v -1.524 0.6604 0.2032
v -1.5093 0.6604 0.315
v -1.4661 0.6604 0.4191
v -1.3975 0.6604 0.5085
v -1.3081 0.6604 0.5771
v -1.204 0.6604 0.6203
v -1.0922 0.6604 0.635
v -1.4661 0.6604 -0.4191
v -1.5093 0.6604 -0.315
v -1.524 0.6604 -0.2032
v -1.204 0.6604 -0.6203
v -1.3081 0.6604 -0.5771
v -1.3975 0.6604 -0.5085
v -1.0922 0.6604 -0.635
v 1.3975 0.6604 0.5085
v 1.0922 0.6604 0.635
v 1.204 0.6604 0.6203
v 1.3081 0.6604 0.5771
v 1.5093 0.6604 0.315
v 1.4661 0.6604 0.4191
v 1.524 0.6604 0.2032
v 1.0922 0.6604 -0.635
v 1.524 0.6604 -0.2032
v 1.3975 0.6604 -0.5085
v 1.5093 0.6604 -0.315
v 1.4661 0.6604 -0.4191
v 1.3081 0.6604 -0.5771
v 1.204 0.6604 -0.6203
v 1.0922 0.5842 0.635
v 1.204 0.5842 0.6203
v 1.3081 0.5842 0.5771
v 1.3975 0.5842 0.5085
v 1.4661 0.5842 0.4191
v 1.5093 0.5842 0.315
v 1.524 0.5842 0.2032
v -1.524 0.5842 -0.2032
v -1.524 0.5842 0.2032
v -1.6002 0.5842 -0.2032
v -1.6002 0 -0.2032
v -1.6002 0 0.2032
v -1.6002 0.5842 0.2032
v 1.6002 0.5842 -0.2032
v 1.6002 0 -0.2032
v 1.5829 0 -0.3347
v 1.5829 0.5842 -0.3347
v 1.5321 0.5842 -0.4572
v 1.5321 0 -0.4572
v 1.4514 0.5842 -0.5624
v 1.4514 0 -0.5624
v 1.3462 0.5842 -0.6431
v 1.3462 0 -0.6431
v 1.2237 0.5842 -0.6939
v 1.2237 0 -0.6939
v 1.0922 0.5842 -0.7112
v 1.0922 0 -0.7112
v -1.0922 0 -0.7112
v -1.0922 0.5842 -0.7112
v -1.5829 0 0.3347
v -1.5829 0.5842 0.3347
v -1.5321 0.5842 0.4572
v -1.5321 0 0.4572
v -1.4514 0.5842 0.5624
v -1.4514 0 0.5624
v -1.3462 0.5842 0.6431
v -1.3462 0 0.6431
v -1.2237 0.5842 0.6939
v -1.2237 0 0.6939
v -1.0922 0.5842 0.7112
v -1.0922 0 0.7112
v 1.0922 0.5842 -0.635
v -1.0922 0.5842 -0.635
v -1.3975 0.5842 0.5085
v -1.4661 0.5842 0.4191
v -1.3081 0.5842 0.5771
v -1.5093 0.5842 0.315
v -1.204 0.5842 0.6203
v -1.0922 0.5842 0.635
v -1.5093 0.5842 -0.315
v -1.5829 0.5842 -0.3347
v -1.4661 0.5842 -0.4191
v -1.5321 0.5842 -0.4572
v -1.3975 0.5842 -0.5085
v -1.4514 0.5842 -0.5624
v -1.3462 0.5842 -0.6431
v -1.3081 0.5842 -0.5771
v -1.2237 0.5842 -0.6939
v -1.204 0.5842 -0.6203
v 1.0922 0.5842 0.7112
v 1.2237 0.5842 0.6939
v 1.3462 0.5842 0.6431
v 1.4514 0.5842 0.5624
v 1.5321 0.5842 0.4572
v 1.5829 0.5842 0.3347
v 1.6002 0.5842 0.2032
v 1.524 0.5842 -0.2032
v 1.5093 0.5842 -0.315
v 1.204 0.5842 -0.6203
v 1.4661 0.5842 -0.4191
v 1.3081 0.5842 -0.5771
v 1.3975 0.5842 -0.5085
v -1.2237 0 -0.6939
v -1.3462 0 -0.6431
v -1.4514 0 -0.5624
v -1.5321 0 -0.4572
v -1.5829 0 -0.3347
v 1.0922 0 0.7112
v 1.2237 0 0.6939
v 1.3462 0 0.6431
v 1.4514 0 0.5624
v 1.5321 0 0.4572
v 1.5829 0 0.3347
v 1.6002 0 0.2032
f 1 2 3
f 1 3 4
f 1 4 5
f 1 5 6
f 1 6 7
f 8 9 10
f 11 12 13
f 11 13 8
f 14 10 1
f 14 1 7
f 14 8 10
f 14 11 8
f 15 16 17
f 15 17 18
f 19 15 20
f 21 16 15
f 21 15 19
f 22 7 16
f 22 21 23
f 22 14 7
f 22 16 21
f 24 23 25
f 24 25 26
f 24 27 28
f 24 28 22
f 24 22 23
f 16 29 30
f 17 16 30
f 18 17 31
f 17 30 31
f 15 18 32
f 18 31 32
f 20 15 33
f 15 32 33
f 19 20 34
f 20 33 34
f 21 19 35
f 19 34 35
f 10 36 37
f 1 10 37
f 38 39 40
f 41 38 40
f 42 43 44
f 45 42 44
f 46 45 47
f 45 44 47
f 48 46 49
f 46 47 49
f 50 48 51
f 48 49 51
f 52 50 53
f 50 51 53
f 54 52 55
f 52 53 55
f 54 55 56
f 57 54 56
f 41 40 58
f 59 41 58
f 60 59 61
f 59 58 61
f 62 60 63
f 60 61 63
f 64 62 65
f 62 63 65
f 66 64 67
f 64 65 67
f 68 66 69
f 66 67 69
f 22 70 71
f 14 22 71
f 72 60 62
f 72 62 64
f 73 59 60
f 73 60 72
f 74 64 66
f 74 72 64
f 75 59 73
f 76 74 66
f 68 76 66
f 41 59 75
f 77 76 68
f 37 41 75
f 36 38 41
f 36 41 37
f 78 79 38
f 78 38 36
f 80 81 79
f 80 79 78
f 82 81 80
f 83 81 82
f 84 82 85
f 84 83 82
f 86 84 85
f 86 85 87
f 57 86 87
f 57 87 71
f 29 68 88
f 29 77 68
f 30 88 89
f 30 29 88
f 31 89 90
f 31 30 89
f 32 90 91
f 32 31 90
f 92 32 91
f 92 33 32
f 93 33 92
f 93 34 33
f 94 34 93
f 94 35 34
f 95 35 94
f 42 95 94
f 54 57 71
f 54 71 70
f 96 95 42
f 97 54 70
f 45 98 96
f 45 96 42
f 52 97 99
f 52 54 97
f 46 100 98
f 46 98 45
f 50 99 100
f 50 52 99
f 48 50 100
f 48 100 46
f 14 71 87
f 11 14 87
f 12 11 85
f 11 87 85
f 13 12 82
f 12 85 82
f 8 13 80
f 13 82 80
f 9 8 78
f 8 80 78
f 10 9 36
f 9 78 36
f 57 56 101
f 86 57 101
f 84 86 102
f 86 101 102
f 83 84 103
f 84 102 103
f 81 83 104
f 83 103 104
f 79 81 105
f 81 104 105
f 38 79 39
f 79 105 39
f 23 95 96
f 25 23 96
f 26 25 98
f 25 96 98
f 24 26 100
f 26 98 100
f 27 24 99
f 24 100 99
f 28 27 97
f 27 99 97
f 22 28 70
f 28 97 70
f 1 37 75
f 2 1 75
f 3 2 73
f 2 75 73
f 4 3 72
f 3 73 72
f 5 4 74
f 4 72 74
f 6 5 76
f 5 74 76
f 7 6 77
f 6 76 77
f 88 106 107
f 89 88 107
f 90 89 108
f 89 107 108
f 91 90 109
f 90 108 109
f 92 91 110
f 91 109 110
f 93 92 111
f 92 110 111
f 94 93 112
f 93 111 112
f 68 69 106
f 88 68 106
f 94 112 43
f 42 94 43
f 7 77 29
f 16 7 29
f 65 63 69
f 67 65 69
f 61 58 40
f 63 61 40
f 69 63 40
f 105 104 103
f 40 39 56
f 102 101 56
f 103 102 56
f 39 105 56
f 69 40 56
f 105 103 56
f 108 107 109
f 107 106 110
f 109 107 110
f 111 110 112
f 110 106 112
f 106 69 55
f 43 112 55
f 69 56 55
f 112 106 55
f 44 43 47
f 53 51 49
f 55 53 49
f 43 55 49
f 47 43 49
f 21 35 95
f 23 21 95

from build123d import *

# Parameters (mm, degrees)
BOSS_EXTRUDE1_DEPTH = 0.5842
BOSS_EXTRUDE2_DEPTH = 0.0762


with BuildPart() as part:
    # Sketch1 → Boss-Extrude1 (new body)
    with BuildSketch(Plane(origin=(0, 0, 0), x_dir=(1, 0, 0), z_dir=(0, 1, 0))):
        with BuildLine():
            Line((-1.6002, 0.2032), (-1.6002, -0.2032))
            ThreePointArc((-1.6002, -0.2032), (-1.451410245, -0.562410245), (-1.0922, -0.7112))
            Line((-1.0922, -0.7112), (1.0922, -0.7112))
            ThreePointArc((1.0922, -0.7112), (1.451410245, -0.562410245), (1.6002, -0.2032))
            Line((1.6002, -0.2032), (1.6002, 0.2032))
            ThreePointArc((1.6002, 0.2032), (1.451410245, 0.562410245), (1.0922, 0.7112))
            Line((1.0922, 0.7112), (-1.0922, 0.7112))
            ThreePointArc((-1.0922, 0.7112), (-1.451410245, 0.562410245), (-1.6002, 0.2032))
        make_face()
    extrude(amount=BOSS_EXTRUDE1_DEPTH)

    # Sketch2 → Boss-Extrude2 (add)
    with BuildSketch(Plane(origin=(0, 0.5842, 0), x_dir=(1, 0, 0), z_dir=(0, 1, 0))):
        with BuildLine():
            Line((-1.524, 0.2032), (-1.524, -0.2032))
            ThreePointArc((-1.524, -0.2032), (-1.397528708, -0.508528708), (-1.0922, -0.635))
            Line((-1.0922, -0.635), (1.0922, -0.635))
            ThreePointArc((1.0922, -0.635), (1.397528708, -0.508528708), (1.524, -0.2032))
            Line((1.524, -0.2032), (1.524, 0.2032))
            ThreePointArc((1.524, 0.2032), (1.397528708, 0.508528708), (1.0922, 0.635))
            Line((1.0922, 0.635), (-1.0922, 0.635))
            ThreePointArc((-1.0922, 0.635), (-1.397528708, 0.508528708), (-1.524, 0.2032))
        make_face()
    extrude(amount=BOSS_EXTRUDE2_DEPTH)


solid = part.part
